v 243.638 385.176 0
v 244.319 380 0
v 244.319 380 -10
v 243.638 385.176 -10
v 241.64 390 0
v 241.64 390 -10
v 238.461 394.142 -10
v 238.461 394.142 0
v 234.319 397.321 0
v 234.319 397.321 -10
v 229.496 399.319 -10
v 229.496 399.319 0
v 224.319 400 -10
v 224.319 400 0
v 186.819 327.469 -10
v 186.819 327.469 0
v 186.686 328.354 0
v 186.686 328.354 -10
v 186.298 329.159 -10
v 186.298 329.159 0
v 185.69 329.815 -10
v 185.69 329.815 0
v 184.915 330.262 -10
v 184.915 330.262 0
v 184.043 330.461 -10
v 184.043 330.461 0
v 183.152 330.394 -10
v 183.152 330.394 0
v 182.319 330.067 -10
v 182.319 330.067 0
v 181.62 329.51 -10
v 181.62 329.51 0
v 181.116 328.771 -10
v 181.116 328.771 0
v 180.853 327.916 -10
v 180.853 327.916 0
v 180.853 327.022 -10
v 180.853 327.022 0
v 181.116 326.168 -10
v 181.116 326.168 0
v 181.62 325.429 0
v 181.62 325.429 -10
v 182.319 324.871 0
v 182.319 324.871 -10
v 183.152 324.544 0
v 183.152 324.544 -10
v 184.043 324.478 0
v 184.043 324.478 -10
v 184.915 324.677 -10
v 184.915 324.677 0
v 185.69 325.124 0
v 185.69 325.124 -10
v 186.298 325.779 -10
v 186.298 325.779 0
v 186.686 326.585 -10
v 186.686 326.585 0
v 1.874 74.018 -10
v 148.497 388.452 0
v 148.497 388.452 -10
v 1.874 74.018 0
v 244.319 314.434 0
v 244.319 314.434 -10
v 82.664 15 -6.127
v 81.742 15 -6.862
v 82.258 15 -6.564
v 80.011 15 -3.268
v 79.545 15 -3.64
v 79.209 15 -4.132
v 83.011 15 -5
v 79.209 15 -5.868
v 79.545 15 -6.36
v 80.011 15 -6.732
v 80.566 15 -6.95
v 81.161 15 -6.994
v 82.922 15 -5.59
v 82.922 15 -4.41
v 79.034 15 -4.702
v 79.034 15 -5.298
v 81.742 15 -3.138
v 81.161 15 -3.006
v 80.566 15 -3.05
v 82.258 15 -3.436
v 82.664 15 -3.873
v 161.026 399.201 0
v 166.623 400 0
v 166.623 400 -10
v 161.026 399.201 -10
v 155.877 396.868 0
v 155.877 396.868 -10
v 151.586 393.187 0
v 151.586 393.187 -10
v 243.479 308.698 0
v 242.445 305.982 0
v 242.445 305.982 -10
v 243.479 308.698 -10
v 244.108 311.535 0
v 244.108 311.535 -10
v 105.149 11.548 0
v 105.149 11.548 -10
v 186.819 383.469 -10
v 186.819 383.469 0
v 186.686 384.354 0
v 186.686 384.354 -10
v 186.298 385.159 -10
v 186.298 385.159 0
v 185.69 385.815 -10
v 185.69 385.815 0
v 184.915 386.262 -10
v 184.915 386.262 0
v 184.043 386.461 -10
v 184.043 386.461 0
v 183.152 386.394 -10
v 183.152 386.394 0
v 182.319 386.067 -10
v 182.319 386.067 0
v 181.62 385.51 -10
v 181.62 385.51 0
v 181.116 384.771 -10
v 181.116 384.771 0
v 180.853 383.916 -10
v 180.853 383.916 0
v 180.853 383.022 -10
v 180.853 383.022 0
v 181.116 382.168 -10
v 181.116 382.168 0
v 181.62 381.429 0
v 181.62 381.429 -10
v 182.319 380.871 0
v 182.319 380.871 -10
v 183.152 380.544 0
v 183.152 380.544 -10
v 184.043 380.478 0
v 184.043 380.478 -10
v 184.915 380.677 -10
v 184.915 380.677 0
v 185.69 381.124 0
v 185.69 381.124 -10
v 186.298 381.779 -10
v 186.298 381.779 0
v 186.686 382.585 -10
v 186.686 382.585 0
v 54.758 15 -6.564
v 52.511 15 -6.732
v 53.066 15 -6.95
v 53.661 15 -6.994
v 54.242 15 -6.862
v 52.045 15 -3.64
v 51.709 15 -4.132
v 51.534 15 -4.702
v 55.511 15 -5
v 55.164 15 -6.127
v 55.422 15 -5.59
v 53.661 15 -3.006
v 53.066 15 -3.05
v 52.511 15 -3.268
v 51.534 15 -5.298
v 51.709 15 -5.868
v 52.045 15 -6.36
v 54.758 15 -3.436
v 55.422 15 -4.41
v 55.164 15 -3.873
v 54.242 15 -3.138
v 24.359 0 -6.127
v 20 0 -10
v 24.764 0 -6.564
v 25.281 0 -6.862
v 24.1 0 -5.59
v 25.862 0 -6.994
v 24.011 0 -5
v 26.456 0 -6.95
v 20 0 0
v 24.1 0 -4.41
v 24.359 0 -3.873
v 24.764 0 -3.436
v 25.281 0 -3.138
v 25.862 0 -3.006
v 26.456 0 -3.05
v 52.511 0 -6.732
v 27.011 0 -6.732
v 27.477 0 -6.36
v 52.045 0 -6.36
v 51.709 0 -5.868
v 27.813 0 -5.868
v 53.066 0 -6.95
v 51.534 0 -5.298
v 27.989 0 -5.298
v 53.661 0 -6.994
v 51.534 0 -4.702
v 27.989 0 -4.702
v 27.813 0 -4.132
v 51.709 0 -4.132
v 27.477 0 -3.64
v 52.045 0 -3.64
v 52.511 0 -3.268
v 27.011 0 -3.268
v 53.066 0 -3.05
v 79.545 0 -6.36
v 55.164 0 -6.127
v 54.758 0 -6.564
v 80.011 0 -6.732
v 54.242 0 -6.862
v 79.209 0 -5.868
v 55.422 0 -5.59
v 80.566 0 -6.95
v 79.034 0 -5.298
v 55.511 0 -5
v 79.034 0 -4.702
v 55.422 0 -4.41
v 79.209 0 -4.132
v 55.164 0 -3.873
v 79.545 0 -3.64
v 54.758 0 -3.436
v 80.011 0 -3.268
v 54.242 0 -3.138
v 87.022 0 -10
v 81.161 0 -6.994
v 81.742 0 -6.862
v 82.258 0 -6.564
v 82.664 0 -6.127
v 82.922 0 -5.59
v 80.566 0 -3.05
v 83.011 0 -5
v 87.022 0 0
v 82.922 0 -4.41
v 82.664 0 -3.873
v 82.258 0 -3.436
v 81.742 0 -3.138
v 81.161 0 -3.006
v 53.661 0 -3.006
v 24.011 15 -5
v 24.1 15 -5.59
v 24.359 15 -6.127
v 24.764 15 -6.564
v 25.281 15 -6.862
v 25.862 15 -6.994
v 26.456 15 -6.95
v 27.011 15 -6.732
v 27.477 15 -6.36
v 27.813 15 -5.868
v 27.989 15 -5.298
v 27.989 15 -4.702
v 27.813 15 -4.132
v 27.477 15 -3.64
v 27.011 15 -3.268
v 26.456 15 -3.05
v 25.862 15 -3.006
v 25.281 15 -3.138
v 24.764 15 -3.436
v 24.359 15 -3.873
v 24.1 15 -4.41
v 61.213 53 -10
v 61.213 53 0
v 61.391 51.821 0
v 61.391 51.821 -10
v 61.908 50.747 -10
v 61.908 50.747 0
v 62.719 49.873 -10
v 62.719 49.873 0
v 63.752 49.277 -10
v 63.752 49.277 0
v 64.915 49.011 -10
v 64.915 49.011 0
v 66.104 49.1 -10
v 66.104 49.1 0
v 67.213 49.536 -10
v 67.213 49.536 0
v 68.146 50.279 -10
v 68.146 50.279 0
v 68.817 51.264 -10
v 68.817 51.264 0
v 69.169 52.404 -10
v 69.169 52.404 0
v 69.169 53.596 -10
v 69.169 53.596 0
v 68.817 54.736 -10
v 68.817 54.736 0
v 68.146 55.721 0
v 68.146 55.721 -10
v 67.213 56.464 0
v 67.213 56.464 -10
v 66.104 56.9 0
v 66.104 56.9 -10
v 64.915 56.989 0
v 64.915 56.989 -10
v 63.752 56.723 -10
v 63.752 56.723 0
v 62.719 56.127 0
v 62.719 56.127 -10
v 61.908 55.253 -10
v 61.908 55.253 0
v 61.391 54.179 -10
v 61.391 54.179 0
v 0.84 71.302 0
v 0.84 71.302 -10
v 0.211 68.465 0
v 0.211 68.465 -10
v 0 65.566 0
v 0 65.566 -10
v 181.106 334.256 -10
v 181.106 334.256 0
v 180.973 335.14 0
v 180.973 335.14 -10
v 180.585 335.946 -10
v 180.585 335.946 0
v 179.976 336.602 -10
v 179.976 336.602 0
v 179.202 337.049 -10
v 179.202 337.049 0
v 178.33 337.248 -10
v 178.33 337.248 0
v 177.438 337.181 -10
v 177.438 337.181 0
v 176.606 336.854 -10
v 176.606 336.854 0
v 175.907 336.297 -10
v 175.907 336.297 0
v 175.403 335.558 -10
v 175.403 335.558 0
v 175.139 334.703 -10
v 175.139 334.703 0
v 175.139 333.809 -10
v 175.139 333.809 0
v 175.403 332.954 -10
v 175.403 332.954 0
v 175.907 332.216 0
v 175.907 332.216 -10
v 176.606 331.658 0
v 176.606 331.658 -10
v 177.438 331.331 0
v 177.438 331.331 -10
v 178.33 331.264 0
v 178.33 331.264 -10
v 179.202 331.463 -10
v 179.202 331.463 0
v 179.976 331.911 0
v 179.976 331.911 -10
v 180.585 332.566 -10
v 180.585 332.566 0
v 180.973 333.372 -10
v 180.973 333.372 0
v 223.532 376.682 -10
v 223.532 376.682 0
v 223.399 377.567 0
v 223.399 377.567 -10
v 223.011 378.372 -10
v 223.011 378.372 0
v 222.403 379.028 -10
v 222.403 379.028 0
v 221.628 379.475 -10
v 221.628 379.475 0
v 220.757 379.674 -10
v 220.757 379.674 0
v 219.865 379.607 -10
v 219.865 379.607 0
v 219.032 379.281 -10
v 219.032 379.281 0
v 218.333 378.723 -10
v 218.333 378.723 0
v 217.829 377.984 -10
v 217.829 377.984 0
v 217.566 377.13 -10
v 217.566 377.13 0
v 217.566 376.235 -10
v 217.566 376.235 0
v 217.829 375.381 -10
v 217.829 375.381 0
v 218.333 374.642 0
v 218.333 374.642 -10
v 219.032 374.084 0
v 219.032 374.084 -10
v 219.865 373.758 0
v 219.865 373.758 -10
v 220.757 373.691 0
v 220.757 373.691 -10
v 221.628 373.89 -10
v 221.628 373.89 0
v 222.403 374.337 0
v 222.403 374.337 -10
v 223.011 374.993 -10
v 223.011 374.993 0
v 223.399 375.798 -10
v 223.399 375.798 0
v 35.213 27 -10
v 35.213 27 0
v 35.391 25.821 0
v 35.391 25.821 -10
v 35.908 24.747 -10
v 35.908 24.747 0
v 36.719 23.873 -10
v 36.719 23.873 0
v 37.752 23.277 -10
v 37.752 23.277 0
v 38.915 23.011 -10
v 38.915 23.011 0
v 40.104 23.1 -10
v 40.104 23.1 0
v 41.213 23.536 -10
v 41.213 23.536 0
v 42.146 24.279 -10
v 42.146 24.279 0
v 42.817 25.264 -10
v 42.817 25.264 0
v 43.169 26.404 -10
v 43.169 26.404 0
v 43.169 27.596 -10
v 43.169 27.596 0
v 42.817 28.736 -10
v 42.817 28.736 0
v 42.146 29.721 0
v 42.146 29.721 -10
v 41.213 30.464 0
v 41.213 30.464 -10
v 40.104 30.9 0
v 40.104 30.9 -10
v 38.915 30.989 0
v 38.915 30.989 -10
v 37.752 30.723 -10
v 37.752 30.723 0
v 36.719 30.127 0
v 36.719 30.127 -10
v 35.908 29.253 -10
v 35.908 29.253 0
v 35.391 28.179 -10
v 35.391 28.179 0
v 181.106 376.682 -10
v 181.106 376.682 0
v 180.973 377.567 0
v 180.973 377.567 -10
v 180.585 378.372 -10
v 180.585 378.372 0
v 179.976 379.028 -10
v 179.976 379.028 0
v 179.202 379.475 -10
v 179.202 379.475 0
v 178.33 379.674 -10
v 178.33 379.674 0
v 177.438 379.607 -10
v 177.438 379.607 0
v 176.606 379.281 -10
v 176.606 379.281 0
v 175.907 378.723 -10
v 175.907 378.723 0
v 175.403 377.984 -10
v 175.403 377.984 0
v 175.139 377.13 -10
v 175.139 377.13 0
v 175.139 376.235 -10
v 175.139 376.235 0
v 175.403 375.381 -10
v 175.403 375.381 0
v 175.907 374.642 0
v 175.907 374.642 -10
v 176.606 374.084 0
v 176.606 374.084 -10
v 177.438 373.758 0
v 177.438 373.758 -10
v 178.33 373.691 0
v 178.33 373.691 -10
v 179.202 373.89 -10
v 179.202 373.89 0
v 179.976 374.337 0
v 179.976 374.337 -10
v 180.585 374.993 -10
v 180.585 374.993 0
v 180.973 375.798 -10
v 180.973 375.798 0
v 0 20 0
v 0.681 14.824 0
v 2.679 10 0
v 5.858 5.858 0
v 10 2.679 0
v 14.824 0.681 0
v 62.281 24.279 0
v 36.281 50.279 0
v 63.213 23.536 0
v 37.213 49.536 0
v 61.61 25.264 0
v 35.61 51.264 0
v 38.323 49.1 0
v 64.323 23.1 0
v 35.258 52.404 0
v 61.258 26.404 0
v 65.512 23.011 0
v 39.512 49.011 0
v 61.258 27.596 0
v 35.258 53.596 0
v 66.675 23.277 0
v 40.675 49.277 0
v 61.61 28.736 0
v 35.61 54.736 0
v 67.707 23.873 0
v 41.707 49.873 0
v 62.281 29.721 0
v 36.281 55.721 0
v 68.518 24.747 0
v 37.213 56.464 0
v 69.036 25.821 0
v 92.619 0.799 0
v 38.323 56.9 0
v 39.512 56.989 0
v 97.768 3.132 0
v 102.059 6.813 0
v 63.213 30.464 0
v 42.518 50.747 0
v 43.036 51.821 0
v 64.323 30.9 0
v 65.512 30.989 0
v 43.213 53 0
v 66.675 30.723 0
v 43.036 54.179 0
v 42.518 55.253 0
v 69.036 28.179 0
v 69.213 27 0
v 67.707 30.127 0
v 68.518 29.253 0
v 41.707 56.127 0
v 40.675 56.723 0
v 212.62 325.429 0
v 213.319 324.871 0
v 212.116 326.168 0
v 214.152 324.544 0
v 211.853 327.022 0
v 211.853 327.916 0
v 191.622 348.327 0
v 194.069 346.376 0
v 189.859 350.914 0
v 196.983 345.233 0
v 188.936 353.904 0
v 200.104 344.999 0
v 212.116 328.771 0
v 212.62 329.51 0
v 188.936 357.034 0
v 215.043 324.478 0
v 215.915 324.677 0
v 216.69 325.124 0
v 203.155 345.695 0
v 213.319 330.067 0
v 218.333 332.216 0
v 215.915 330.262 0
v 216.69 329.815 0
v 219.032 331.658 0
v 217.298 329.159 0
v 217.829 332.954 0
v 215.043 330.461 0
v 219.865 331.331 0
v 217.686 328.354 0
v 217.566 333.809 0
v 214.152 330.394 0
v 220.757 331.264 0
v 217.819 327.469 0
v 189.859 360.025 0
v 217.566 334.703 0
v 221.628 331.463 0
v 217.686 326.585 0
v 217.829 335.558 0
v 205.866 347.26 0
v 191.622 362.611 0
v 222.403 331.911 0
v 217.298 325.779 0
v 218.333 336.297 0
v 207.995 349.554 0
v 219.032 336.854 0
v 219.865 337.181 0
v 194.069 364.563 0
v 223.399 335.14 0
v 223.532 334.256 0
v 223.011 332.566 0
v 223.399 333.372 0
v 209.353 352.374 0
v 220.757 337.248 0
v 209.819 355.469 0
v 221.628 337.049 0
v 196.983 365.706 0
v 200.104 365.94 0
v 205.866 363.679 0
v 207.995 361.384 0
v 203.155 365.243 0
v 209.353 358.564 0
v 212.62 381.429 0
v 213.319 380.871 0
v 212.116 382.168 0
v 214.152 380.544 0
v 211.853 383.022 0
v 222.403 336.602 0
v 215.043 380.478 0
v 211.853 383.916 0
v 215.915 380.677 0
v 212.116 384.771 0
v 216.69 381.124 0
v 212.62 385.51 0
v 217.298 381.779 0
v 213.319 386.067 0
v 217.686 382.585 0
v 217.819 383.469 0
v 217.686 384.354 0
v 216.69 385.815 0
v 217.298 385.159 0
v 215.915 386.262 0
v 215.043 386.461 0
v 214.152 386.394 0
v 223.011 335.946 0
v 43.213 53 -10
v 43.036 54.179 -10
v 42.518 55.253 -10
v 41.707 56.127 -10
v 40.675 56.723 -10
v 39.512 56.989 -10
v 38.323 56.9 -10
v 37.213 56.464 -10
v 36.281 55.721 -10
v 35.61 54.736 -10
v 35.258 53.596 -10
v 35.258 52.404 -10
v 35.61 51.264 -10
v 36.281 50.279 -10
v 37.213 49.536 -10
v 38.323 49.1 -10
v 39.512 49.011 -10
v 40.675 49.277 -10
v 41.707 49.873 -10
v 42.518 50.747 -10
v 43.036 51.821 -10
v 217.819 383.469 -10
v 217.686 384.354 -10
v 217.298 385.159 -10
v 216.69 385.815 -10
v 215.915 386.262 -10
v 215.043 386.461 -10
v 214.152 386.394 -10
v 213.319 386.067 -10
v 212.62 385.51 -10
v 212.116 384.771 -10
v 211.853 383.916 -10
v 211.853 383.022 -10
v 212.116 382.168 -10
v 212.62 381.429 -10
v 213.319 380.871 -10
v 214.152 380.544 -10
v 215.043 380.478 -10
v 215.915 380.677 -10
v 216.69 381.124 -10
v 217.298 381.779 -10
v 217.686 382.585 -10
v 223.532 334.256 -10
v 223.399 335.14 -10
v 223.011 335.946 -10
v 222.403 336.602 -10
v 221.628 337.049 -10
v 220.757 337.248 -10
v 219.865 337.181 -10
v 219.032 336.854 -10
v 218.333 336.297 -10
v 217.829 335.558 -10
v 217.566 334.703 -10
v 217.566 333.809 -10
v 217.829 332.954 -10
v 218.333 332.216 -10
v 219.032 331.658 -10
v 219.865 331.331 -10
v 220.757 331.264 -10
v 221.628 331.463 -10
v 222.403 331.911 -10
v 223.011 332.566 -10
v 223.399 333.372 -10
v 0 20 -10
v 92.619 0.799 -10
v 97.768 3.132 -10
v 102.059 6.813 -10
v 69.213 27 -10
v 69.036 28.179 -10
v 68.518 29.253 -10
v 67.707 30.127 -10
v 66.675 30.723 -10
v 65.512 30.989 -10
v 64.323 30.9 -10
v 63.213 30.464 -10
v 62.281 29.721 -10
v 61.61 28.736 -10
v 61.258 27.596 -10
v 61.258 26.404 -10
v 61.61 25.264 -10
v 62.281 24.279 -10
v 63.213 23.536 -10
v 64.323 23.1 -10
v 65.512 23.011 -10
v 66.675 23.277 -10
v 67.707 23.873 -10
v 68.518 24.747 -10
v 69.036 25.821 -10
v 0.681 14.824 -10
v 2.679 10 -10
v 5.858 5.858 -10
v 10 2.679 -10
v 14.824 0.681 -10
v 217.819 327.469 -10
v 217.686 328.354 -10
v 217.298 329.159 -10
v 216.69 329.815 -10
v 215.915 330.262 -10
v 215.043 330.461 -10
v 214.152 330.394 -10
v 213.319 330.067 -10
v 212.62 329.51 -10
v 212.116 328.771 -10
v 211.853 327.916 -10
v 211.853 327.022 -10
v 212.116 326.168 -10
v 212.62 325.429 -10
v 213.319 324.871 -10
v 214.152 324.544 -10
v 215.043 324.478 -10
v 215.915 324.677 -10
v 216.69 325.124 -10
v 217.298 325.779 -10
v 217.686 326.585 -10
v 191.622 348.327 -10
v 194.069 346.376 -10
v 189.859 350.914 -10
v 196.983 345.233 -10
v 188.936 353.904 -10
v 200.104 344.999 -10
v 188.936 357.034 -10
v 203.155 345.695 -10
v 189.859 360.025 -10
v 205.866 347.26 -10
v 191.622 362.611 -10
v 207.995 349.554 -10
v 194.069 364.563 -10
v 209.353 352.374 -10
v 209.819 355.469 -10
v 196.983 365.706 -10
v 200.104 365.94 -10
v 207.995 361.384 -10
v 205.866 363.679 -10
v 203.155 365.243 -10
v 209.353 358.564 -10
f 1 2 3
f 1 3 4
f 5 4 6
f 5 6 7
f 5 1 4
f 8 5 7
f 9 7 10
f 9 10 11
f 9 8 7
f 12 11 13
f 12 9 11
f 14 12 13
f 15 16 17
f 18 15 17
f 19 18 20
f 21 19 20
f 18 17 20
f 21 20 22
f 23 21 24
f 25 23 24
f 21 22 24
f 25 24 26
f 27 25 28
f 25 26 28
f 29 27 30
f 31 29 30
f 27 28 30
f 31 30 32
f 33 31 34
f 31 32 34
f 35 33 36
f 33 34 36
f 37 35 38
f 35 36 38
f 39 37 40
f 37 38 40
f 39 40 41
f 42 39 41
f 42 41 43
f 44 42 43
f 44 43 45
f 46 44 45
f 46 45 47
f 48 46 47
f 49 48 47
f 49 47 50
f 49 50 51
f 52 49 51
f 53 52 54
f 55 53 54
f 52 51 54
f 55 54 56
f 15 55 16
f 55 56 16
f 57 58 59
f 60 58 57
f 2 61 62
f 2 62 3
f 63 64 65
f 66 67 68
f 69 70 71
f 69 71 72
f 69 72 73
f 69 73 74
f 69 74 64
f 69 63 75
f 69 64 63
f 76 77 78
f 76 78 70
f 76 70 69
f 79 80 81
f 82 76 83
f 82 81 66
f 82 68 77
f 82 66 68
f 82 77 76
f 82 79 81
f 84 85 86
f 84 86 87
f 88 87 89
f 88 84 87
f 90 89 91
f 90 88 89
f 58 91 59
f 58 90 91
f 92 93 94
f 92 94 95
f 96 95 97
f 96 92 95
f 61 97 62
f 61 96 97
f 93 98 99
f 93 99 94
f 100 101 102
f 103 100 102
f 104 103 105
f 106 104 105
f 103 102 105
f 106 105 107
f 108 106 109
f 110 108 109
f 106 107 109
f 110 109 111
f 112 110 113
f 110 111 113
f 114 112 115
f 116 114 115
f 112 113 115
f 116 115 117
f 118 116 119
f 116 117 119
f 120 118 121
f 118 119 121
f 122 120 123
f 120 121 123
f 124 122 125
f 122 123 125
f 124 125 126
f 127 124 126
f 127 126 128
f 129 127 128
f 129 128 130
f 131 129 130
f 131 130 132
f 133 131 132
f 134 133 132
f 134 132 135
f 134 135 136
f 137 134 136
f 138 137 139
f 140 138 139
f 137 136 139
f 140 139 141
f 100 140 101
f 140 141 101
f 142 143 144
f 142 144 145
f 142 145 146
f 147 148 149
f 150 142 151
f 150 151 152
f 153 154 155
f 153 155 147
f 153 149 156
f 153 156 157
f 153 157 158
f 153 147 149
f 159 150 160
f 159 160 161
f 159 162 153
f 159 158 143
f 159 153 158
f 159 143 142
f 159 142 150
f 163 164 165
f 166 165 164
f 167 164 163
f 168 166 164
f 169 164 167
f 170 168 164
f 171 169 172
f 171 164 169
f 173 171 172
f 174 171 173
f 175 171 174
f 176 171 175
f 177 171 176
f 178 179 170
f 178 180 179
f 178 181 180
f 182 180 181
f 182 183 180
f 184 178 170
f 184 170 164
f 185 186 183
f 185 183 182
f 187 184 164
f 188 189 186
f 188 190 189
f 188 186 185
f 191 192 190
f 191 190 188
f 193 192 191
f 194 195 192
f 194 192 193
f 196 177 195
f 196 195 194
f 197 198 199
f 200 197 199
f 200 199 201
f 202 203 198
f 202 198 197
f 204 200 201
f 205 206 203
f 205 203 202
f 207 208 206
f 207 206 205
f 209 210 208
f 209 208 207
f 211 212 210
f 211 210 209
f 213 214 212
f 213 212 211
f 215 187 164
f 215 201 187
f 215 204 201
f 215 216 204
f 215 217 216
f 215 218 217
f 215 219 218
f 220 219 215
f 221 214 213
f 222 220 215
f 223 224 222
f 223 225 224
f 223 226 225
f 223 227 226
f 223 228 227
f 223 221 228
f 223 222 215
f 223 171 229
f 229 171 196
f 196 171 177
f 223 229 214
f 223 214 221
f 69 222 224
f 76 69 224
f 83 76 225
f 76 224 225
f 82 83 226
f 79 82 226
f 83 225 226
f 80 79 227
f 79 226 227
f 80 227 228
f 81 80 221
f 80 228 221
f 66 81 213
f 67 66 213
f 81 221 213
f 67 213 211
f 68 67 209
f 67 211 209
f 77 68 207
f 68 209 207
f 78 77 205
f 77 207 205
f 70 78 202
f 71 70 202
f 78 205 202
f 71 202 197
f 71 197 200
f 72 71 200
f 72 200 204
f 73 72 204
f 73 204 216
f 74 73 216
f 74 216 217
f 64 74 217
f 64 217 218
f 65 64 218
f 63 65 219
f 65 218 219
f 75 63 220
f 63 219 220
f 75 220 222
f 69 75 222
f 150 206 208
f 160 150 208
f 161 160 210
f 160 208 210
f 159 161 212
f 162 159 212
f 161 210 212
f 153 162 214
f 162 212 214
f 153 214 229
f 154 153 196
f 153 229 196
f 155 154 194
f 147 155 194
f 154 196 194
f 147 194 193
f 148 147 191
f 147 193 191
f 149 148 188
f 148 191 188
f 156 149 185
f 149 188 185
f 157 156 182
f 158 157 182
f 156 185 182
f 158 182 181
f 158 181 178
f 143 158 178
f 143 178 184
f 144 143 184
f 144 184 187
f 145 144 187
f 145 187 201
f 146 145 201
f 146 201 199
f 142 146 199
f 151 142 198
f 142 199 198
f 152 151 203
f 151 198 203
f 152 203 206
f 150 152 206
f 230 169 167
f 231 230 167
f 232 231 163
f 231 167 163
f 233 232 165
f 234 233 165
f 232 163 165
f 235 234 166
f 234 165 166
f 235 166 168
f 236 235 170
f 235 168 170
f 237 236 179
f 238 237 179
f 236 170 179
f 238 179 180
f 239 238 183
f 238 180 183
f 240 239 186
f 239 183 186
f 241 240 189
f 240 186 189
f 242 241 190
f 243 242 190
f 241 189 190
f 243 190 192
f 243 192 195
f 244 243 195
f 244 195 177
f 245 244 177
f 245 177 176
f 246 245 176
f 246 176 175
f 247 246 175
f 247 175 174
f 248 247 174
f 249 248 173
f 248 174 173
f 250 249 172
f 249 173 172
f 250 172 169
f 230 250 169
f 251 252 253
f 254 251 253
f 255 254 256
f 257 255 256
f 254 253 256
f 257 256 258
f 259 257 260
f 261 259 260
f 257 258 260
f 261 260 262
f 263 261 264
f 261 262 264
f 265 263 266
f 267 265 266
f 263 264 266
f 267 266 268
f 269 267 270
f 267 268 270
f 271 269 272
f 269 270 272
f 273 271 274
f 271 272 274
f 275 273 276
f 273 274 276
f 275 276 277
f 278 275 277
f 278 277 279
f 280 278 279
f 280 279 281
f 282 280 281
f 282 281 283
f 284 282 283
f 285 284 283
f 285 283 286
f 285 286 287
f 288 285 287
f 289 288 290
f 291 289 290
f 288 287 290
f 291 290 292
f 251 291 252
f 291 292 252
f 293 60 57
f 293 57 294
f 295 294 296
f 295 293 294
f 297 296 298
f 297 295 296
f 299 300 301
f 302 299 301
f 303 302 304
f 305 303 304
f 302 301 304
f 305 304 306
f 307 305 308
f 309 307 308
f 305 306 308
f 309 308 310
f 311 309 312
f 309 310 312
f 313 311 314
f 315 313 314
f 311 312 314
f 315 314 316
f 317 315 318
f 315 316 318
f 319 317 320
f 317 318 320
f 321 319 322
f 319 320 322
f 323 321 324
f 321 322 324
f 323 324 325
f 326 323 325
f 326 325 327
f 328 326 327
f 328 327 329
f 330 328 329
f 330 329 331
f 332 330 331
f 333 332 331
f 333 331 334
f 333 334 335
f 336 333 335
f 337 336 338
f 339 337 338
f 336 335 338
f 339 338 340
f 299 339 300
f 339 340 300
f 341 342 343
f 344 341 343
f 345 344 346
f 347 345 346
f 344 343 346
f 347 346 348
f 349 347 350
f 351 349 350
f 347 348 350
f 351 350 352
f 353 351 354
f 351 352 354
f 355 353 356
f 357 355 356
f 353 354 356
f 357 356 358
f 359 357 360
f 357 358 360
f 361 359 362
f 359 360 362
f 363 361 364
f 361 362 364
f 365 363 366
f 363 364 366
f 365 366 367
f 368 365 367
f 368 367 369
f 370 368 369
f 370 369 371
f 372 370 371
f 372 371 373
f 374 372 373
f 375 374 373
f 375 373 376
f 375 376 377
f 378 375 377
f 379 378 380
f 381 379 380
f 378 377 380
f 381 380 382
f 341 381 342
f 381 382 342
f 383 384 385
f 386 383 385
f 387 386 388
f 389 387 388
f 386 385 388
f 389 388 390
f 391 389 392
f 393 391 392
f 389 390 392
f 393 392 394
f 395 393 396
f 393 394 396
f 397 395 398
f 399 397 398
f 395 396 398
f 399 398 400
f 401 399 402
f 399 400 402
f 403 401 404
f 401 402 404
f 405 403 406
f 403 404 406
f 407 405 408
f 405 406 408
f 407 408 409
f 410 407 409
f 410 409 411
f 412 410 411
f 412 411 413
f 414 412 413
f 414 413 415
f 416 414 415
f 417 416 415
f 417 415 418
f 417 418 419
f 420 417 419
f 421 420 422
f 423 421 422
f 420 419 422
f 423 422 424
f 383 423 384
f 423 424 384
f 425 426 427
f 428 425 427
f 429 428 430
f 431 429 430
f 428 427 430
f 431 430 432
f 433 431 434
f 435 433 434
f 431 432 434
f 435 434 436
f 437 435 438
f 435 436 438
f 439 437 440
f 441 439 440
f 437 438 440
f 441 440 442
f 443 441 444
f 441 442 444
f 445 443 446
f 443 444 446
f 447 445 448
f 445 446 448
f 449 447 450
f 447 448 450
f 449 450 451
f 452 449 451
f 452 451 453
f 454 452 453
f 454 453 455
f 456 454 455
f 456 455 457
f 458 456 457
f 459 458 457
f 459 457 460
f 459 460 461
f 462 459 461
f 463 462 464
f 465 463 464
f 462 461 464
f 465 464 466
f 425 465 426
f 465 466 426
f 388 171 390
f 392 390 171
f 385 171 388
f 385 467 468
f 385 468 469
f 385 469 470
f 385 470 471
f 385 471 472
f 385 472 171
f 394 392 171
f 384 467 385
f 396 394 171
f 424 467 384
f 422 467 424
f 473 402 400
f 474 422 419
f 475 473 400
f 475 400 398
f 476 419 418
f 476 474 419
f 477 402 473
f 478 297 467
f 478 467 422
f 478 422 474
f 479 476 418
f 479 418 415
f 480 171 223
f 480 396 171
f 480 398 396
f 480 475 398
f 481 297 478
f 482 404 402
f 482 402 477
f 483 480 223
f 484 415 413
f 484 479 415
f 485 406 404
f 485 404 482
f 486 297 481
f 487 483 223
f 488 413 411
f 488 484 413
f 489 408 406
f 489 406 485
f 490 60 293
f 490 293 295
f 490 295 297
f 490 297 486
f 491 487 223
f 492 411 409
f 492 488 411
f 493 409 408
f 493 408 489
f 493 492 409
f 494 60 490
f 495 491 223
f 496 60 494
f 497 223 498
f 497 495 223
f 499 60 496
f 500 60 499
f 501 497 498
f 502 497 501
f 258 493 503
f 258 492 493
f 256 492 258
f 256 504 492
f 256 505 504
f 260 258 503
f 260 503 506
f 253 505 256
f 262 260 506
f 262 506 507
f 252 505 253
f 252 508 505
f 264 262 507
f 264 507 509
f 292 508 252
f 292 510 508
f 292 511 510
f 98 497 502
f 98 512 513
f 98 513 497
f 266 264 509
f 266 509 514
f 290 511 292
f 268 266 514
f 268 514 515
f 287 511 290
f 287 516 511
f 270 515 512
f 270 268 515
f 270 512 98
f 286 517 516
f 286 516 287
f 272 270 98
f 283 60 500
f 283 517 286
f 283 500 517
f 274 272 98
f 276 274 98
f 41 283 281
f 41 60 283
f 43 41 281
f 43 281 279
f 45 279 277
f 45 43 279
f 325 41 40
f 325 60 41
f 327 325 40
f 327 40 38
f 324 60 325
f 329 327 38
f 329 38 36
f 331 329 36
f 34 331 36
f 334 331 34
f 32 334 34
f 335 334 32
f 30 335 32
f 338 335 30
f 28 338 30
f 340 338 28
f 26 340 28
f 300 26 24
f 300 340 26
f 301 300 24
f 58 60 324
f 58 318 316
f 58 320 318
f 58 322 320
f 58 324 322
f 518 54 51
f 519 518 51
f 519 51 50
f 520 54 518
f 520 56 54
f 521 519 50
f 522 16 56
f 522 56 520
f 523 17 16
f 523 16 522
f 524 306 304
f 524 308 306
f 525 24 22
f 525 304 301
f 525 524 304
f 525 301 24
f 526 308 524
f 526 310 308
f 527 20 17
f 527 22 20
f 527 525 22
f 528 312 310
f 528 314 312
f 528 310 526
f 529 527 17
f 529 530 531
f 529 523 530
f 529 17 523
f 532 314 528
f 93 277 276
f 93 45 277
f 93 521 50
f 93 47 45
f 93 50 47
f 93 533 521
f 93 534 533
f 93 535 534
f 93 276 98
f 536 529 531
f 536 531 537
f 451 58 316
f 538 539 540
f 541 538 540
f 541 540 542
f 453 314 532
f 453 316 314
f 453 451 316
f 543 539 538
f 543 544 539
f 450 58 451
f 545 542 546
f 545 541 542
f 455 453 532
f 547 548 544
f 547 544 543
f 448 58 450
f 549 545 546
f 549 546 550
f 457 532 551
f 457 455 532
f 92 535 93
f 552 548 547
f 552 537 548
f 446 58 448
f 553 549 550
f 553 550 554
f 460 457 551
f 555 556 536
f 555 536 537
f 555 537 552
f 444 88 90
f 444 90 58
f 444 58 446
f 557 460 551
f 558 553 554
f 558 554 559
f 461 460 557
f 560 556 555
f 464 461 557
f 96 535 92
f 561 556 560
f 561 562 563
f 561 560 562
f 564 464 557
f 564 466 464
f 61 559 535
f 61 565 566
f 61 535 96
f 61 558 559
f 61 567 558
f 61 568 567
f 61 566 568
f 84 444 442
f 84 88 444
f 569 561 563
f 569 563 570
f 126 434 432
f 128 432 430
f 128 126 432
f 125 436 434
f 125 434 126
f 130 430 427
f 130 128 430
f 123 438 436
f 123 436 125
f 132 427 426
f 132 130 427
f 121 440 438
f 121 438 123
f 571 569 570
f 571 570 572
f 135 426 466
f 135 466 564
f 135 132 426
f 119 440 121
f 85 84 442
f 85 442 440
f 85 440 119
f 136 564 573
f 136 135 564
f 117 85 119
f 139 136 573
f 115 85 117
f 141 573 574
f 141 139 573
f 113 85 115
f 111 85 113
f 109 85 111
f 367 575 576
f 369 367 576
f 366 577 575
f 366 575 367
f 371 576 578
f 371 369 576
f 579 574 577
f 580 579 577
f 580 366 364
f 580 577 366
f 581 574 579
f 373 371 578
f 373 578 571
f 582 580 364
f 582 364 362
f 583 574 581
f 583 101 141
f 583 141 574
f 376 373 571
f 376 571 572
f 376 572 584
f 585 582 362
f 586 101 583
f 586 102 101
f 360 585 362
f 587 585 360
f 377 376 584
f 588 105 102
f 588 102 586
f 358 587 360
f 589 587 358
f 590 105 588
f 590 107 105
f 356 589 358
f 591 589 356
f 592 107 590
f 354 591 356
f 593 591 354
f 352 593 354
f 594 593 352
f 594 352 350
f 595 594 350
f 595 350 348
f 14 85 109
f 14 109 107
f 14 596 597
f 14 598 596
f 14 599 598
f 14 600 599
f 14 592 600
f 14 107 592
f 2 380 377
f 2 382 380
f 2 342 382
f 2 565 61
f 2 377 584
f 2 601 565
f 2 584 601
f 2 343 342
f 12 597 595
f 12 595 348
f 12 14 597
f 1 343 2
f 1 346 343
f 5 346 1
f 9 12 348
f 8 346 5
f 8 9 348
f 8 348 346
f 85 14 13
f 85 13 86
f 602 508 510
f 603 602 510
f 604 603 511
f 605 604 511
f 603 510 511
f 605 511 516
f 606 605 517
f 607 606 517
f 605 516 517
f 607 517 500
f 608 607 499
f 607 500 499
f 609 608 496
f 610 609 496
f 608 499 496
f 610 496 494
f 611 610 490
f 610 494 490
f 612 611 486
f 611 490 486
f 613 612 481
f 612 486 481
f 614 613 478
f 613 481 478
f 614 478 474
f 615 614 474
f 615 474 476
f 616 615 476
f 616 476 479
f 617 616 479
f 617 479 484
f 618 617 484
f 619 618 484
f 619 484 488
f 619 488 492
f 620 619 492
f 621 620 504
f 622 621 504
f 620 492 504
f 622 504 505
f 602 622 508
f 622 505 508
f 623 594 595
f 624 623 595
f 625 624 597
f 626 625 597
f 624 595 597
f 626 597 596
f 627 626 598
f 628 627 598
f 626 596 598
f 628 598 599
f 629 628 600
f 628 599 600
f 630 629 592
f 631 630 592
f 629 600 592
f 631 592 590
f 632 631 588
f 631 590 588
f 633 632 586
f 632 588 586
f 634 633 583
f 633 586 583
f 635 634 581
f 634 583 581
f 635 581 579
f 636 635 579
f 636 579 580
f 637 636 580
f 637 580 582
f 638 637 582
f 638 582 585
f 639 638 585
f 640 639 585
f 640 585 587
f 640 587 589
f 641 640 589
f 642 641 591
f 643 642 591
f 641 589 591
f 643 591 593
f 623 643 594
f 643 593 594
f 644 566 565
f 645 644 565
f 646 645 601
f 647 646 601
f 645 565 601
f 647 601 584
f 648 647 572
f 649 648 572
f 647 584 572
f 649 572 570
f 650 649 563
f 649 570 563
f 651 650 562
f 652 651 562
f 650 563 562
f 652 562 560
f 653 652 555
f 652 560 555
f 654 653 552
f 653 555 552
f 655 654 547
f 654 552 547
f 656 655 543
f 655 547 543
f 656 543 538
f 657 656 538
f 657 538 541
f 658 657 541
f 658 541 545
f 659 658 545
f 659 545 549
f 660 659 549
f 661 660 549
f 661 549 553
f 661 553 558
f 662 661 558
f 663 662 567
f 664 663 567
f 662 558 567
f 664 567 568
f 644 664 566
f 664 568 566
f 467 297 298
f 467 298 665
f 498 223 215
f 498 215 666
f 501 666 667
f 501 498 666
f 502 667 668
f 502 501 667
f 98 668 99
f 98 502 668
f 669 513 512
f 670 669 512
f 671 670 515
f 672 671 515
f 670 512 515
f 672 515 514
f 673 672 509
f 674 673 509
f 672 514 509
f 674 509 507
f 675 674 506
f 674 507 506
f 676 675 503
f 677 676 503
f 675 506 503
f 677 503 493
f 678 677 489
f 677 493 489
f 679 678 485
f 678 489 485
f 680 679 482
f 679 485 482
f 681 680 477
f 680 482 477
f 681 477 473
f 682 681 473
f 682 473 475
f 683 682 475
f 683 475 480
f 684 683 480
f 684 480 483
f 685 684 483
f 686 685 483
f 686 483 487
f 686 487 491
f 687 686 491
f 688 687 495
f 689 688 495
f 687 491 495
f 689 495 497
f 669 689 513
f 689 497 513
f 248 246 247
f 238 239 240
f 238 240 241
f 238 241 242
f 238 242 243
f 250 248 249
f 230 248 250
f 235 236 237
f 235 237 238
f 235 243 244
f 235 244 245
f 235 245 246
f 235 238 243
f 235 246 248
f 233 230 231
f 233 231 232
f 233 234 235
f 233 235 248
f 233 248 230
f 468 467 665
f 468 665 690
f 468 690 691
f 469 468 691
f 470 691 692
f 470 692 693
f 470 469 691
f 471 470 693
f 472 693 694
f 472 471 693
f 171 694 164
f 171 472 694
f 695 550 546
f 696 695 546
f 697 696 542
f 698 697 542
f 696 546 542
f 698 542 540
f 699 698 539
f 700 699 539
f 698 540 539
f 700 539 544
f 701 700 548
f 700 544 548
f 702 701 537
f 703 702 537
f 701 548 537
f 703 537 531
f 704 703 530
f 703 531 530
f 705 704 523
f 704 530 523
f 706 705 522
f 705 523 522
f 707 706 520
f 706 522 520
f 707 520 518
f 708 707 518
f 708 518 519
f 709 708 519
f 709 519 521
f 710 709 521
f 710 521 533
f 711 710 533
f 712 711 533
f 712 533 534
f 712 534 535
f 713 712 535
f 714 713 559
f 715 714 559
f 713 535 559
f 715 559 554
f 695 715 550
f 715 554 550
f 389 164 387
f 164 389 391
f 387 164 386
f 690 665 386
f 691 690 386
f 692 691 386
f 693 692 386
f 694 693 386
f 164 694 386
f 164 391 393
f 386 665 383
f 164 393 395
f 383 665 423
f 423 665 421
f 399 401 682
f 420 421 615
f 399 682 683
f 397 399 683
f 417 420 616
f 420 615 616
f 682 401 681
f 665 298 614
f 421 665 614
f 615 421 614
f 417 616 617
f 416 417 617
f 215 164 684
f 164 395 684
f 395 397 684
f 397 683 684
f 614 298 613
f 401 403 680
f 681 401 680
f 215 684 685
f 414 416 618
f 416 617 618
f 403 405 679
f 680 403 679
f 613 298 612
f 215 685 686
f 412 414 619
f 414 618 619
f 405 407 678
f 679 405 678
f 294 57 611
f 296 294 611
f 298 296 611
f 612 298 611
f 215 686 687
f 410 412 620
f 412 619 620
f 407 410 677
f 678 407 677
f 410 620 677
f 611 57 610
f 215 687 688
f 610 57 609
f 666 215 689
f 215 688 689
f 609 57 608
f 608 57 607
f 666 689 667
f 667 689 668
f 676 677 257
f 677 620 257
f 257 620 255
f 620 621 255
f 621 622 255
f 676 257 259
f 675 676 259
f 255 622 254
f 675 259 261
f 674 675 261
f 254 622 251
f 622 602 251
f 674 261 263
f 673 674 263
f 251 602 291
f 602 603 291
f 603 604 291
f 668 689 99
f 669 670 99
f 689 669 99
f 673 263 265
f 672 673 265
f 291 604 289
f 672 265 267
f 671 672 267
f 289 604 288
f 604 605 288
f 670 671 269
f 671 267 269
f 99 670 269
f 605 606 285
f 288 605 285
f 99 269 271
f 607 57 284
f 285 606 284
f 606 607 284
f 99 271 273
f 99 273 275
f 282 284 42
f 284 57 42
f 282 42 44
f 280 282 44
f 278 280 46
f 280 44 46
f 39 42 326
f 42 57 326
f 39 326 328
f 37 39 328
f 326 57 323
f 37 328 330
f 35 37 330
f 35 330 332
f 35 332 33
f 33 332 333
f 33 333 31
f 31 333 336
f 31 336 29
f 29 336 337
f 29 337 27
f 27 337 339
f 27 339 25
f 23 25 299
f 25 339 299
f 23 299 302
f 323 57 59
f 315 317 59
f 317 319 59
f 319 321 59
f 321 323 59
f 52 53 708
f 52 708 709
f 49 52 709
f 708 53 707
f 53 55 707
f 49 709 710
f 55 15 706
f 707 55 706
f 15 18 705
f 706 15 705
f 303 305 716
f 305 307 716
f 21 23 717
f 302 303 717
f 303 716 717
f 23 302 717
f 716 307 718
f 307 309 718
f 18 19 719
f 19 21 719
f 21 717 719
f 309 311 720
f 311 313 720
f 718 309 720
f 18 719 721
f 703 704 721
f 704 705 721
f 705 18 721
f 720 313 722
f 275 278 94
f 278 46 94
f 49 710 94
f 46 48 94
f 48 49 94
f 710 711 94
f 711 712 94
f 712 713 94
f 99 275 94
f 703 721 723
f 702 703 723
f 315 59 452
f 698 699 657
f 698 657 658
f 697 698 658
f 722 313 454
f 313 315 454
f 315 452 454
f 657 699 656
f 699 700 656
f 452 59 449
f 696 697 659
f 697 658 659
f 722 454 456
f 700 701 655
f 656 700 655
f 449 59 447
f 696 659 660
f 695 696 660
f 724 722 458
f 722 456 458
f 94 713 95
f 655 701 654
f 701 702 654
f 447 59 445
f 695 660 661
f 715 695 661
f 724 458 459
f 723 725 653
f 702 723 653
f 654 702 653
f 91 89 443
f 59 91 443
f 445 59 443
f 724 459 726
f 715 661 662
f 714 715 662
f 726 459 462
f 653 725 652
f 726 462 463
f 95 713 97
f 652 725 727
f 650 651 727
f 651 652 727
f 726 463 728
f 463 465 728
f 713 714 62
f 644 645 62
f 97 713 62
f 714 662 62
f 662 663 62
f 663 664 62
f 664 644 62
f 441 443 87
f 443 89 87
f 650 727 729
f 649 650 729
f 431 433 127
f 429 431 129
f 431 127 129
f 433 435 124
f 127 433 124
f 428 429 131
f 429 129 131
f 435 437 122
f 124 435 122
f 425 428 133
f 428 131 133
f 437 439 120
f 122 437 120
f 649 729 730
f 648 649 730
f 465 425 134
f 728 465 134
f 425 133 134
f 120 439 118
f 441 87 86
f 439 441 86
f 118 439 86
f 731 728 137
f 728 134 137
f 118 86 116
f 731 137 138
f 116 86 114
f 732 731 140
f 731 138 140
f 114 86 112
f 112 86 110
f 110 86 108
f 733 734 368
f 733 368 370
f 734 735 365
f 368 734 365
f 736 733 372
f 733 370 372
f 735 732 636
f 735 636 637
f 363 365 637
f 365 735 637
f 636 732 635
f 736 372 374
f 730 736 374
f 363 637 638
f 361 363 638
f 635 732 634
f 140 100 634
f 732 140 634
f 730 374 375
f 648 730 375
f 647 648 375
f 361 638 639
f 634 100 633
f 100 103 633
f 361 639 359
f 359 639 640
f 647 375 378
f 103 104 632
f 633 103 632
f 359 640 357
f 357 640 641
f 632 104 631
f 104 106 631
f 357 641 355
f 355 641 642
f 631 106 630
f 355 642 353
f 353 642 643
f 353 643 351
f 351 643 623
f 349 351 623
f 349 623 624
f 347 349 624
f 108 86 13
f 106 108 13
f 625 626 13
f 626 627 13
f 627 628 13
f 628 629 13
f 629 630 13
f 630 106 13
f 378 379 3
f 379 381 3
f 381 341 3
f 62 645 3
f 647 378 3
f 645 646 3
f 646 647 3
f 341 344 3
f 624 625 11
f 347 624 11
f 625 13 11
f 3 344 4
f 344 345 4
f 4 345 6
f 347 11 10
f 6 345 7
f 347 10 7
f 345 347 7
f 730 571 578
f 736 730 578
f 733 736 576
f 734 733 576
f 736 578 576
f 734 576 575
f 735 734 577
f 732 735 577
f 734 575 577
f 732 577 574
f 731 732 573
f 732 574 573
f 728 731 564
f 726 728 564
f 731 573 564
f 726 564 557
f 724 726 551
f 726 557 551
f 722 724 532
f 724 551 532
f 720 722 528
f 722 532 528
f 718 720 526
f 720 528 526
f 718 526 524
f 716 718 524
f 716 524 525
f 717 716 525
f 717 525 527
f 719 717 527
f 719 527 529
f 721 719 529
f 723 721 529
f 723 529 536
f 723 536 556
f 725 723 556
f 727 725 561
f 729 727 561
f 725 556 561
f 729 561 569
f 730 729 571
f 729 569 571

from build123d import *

# Parameters (mm, degrees)
SCHIZZO1_R                   = 4
SCHIZZO1_R_2                 = 10.5
SCHIZZO1_R_3                 = 3
ESTRUSIONE_ESTRUSIONE2_DEPTH = 10
SCHIZZO2_R                   = 2
TAGLIO_ESTRUSIONE1_DEPTH     = 15


with BuildPart() as part:
    # Schizzo1 → Estrusione-Estrusione2 (new body)
    with BuildSketch(Plane.XY):
        with BuildLine():
            Line((20, 0), (87.022408988, 0))
            ThreePointArc((87.022408988, 0), (97.768401155, 3.132171084), (105.148564729, 11.547634765))
            Line((105.148564729, 11.547634765), (242.445343973, 305.981528018))
            ThreePointArc((242.445343973, 305.981528018), (243.845108375, 310.105100974), (244.319188233, 314.433893253))
            Line((244.319188233, 314.433893253), (244.319188233, 380))
            ThreePointArc((244.319188233, 380), (238.461323856, 394.142135624), (224.319188233, 400))
            Line((224.319188233, 400), (166.622932407, 400))
            ThreePointArc((166.622932407, 400), (155.87694024, 396.867828916), (148.496776667, 388.452365235))
            Line((148.496776667, 388.452365235), (1.873844259, 74.018471982))
            ThreePointArc((1.873844259, 74.018471982), (0.474079858, 69.894899026), (0, 65.566106747))
            Line((0, 65.566106747), (0, 20))
            ThreePointArc((0, 20), (5.857864376, 5.857864376), (20, 0))
        make_face()
        with Locations((39.213445393, 53)):
            Circle(SCHIZZO1_R, mode=Mode.SUBTRACT)
        with Locations(Location((65.213445393, 53, 0), (0, 0, 180))):
            Circle(SCHIZZO1_R, mode=Mode.SUBTRACT)
        with Locations((65.213445393, 27)):
            Circle(SCHIZZO1_R, mode=Mode.SUBTRACT)
        with Locations(Location((39.213445393, 27, 0), (0, 0, 180))):
            Circle(SCHIZZO1_R, mode=Mode.SUBTRACT)
        with Locations((199.319188233, 355.469283566)):
            Circle(SCHIZZO1_R_2, mode=Mode.SUBTRACT)
        with Locations((183.819188233, 383.469283566)):
            Circle(SCHIZZO1_R_3, mode=Mode.SUBTRACT)
        with Locations((214.819188233, 383.469283566)):
            Circle(SCHIZZO1_R_3, mode=Mode.SUBTRACT)
        with Locations((220.532391668, 376.682487002)):
            Circle(SCHIZZO1_R_3, mode=Mode.SUBTRACT)
        with Locations((220.532391668, 334.256080131)):
            Circle(SCHIZZO1_R_3, mode=Mode.SUBTRACT)
        with Locations((214.819188233, 327.469283566)):
            Circle(SCHIZZO1_R_3, mode=Mode.SUBTRACT)
        with Locations((183.819188233, 327.469283566)):
            Circle(SCHIZZO1_R_3, mode=Mode.SUBTRACT)
        with Locations((178.105984797, 334.256080131)):
            Circle(SCHIZZO1_R_3, mode=Mode.SUBTRACT)
        with Locations((178.105984797, 376.682487002)):
            Circle(SCHIZZO1_R_3, mode=Mode.SUBTRACT)
    extrude(amount=-ESTRUSIONE_ESTRUSIONE2_DEPTH)

    # Schizzo2 → Taglio-Estrusione1 (cut)
    with BuildSketch(Plane.XZ):
        with Locations((53.511204494, -5)):
            Circle(SCHIZZO2_R)
        with Locations((81.011204494, -5)):
            Circle(SCHIZZO2_R)
        with Locations(Location((26.011204494, -5, 0), (0, 0, 180))):
            Circle(SCHIZZO2_R)
    extrude(amount=-TAGLIO_ESTRUSIONE1_DEPTH, mode=Mode.SUBTRACT)


solid = part.part
